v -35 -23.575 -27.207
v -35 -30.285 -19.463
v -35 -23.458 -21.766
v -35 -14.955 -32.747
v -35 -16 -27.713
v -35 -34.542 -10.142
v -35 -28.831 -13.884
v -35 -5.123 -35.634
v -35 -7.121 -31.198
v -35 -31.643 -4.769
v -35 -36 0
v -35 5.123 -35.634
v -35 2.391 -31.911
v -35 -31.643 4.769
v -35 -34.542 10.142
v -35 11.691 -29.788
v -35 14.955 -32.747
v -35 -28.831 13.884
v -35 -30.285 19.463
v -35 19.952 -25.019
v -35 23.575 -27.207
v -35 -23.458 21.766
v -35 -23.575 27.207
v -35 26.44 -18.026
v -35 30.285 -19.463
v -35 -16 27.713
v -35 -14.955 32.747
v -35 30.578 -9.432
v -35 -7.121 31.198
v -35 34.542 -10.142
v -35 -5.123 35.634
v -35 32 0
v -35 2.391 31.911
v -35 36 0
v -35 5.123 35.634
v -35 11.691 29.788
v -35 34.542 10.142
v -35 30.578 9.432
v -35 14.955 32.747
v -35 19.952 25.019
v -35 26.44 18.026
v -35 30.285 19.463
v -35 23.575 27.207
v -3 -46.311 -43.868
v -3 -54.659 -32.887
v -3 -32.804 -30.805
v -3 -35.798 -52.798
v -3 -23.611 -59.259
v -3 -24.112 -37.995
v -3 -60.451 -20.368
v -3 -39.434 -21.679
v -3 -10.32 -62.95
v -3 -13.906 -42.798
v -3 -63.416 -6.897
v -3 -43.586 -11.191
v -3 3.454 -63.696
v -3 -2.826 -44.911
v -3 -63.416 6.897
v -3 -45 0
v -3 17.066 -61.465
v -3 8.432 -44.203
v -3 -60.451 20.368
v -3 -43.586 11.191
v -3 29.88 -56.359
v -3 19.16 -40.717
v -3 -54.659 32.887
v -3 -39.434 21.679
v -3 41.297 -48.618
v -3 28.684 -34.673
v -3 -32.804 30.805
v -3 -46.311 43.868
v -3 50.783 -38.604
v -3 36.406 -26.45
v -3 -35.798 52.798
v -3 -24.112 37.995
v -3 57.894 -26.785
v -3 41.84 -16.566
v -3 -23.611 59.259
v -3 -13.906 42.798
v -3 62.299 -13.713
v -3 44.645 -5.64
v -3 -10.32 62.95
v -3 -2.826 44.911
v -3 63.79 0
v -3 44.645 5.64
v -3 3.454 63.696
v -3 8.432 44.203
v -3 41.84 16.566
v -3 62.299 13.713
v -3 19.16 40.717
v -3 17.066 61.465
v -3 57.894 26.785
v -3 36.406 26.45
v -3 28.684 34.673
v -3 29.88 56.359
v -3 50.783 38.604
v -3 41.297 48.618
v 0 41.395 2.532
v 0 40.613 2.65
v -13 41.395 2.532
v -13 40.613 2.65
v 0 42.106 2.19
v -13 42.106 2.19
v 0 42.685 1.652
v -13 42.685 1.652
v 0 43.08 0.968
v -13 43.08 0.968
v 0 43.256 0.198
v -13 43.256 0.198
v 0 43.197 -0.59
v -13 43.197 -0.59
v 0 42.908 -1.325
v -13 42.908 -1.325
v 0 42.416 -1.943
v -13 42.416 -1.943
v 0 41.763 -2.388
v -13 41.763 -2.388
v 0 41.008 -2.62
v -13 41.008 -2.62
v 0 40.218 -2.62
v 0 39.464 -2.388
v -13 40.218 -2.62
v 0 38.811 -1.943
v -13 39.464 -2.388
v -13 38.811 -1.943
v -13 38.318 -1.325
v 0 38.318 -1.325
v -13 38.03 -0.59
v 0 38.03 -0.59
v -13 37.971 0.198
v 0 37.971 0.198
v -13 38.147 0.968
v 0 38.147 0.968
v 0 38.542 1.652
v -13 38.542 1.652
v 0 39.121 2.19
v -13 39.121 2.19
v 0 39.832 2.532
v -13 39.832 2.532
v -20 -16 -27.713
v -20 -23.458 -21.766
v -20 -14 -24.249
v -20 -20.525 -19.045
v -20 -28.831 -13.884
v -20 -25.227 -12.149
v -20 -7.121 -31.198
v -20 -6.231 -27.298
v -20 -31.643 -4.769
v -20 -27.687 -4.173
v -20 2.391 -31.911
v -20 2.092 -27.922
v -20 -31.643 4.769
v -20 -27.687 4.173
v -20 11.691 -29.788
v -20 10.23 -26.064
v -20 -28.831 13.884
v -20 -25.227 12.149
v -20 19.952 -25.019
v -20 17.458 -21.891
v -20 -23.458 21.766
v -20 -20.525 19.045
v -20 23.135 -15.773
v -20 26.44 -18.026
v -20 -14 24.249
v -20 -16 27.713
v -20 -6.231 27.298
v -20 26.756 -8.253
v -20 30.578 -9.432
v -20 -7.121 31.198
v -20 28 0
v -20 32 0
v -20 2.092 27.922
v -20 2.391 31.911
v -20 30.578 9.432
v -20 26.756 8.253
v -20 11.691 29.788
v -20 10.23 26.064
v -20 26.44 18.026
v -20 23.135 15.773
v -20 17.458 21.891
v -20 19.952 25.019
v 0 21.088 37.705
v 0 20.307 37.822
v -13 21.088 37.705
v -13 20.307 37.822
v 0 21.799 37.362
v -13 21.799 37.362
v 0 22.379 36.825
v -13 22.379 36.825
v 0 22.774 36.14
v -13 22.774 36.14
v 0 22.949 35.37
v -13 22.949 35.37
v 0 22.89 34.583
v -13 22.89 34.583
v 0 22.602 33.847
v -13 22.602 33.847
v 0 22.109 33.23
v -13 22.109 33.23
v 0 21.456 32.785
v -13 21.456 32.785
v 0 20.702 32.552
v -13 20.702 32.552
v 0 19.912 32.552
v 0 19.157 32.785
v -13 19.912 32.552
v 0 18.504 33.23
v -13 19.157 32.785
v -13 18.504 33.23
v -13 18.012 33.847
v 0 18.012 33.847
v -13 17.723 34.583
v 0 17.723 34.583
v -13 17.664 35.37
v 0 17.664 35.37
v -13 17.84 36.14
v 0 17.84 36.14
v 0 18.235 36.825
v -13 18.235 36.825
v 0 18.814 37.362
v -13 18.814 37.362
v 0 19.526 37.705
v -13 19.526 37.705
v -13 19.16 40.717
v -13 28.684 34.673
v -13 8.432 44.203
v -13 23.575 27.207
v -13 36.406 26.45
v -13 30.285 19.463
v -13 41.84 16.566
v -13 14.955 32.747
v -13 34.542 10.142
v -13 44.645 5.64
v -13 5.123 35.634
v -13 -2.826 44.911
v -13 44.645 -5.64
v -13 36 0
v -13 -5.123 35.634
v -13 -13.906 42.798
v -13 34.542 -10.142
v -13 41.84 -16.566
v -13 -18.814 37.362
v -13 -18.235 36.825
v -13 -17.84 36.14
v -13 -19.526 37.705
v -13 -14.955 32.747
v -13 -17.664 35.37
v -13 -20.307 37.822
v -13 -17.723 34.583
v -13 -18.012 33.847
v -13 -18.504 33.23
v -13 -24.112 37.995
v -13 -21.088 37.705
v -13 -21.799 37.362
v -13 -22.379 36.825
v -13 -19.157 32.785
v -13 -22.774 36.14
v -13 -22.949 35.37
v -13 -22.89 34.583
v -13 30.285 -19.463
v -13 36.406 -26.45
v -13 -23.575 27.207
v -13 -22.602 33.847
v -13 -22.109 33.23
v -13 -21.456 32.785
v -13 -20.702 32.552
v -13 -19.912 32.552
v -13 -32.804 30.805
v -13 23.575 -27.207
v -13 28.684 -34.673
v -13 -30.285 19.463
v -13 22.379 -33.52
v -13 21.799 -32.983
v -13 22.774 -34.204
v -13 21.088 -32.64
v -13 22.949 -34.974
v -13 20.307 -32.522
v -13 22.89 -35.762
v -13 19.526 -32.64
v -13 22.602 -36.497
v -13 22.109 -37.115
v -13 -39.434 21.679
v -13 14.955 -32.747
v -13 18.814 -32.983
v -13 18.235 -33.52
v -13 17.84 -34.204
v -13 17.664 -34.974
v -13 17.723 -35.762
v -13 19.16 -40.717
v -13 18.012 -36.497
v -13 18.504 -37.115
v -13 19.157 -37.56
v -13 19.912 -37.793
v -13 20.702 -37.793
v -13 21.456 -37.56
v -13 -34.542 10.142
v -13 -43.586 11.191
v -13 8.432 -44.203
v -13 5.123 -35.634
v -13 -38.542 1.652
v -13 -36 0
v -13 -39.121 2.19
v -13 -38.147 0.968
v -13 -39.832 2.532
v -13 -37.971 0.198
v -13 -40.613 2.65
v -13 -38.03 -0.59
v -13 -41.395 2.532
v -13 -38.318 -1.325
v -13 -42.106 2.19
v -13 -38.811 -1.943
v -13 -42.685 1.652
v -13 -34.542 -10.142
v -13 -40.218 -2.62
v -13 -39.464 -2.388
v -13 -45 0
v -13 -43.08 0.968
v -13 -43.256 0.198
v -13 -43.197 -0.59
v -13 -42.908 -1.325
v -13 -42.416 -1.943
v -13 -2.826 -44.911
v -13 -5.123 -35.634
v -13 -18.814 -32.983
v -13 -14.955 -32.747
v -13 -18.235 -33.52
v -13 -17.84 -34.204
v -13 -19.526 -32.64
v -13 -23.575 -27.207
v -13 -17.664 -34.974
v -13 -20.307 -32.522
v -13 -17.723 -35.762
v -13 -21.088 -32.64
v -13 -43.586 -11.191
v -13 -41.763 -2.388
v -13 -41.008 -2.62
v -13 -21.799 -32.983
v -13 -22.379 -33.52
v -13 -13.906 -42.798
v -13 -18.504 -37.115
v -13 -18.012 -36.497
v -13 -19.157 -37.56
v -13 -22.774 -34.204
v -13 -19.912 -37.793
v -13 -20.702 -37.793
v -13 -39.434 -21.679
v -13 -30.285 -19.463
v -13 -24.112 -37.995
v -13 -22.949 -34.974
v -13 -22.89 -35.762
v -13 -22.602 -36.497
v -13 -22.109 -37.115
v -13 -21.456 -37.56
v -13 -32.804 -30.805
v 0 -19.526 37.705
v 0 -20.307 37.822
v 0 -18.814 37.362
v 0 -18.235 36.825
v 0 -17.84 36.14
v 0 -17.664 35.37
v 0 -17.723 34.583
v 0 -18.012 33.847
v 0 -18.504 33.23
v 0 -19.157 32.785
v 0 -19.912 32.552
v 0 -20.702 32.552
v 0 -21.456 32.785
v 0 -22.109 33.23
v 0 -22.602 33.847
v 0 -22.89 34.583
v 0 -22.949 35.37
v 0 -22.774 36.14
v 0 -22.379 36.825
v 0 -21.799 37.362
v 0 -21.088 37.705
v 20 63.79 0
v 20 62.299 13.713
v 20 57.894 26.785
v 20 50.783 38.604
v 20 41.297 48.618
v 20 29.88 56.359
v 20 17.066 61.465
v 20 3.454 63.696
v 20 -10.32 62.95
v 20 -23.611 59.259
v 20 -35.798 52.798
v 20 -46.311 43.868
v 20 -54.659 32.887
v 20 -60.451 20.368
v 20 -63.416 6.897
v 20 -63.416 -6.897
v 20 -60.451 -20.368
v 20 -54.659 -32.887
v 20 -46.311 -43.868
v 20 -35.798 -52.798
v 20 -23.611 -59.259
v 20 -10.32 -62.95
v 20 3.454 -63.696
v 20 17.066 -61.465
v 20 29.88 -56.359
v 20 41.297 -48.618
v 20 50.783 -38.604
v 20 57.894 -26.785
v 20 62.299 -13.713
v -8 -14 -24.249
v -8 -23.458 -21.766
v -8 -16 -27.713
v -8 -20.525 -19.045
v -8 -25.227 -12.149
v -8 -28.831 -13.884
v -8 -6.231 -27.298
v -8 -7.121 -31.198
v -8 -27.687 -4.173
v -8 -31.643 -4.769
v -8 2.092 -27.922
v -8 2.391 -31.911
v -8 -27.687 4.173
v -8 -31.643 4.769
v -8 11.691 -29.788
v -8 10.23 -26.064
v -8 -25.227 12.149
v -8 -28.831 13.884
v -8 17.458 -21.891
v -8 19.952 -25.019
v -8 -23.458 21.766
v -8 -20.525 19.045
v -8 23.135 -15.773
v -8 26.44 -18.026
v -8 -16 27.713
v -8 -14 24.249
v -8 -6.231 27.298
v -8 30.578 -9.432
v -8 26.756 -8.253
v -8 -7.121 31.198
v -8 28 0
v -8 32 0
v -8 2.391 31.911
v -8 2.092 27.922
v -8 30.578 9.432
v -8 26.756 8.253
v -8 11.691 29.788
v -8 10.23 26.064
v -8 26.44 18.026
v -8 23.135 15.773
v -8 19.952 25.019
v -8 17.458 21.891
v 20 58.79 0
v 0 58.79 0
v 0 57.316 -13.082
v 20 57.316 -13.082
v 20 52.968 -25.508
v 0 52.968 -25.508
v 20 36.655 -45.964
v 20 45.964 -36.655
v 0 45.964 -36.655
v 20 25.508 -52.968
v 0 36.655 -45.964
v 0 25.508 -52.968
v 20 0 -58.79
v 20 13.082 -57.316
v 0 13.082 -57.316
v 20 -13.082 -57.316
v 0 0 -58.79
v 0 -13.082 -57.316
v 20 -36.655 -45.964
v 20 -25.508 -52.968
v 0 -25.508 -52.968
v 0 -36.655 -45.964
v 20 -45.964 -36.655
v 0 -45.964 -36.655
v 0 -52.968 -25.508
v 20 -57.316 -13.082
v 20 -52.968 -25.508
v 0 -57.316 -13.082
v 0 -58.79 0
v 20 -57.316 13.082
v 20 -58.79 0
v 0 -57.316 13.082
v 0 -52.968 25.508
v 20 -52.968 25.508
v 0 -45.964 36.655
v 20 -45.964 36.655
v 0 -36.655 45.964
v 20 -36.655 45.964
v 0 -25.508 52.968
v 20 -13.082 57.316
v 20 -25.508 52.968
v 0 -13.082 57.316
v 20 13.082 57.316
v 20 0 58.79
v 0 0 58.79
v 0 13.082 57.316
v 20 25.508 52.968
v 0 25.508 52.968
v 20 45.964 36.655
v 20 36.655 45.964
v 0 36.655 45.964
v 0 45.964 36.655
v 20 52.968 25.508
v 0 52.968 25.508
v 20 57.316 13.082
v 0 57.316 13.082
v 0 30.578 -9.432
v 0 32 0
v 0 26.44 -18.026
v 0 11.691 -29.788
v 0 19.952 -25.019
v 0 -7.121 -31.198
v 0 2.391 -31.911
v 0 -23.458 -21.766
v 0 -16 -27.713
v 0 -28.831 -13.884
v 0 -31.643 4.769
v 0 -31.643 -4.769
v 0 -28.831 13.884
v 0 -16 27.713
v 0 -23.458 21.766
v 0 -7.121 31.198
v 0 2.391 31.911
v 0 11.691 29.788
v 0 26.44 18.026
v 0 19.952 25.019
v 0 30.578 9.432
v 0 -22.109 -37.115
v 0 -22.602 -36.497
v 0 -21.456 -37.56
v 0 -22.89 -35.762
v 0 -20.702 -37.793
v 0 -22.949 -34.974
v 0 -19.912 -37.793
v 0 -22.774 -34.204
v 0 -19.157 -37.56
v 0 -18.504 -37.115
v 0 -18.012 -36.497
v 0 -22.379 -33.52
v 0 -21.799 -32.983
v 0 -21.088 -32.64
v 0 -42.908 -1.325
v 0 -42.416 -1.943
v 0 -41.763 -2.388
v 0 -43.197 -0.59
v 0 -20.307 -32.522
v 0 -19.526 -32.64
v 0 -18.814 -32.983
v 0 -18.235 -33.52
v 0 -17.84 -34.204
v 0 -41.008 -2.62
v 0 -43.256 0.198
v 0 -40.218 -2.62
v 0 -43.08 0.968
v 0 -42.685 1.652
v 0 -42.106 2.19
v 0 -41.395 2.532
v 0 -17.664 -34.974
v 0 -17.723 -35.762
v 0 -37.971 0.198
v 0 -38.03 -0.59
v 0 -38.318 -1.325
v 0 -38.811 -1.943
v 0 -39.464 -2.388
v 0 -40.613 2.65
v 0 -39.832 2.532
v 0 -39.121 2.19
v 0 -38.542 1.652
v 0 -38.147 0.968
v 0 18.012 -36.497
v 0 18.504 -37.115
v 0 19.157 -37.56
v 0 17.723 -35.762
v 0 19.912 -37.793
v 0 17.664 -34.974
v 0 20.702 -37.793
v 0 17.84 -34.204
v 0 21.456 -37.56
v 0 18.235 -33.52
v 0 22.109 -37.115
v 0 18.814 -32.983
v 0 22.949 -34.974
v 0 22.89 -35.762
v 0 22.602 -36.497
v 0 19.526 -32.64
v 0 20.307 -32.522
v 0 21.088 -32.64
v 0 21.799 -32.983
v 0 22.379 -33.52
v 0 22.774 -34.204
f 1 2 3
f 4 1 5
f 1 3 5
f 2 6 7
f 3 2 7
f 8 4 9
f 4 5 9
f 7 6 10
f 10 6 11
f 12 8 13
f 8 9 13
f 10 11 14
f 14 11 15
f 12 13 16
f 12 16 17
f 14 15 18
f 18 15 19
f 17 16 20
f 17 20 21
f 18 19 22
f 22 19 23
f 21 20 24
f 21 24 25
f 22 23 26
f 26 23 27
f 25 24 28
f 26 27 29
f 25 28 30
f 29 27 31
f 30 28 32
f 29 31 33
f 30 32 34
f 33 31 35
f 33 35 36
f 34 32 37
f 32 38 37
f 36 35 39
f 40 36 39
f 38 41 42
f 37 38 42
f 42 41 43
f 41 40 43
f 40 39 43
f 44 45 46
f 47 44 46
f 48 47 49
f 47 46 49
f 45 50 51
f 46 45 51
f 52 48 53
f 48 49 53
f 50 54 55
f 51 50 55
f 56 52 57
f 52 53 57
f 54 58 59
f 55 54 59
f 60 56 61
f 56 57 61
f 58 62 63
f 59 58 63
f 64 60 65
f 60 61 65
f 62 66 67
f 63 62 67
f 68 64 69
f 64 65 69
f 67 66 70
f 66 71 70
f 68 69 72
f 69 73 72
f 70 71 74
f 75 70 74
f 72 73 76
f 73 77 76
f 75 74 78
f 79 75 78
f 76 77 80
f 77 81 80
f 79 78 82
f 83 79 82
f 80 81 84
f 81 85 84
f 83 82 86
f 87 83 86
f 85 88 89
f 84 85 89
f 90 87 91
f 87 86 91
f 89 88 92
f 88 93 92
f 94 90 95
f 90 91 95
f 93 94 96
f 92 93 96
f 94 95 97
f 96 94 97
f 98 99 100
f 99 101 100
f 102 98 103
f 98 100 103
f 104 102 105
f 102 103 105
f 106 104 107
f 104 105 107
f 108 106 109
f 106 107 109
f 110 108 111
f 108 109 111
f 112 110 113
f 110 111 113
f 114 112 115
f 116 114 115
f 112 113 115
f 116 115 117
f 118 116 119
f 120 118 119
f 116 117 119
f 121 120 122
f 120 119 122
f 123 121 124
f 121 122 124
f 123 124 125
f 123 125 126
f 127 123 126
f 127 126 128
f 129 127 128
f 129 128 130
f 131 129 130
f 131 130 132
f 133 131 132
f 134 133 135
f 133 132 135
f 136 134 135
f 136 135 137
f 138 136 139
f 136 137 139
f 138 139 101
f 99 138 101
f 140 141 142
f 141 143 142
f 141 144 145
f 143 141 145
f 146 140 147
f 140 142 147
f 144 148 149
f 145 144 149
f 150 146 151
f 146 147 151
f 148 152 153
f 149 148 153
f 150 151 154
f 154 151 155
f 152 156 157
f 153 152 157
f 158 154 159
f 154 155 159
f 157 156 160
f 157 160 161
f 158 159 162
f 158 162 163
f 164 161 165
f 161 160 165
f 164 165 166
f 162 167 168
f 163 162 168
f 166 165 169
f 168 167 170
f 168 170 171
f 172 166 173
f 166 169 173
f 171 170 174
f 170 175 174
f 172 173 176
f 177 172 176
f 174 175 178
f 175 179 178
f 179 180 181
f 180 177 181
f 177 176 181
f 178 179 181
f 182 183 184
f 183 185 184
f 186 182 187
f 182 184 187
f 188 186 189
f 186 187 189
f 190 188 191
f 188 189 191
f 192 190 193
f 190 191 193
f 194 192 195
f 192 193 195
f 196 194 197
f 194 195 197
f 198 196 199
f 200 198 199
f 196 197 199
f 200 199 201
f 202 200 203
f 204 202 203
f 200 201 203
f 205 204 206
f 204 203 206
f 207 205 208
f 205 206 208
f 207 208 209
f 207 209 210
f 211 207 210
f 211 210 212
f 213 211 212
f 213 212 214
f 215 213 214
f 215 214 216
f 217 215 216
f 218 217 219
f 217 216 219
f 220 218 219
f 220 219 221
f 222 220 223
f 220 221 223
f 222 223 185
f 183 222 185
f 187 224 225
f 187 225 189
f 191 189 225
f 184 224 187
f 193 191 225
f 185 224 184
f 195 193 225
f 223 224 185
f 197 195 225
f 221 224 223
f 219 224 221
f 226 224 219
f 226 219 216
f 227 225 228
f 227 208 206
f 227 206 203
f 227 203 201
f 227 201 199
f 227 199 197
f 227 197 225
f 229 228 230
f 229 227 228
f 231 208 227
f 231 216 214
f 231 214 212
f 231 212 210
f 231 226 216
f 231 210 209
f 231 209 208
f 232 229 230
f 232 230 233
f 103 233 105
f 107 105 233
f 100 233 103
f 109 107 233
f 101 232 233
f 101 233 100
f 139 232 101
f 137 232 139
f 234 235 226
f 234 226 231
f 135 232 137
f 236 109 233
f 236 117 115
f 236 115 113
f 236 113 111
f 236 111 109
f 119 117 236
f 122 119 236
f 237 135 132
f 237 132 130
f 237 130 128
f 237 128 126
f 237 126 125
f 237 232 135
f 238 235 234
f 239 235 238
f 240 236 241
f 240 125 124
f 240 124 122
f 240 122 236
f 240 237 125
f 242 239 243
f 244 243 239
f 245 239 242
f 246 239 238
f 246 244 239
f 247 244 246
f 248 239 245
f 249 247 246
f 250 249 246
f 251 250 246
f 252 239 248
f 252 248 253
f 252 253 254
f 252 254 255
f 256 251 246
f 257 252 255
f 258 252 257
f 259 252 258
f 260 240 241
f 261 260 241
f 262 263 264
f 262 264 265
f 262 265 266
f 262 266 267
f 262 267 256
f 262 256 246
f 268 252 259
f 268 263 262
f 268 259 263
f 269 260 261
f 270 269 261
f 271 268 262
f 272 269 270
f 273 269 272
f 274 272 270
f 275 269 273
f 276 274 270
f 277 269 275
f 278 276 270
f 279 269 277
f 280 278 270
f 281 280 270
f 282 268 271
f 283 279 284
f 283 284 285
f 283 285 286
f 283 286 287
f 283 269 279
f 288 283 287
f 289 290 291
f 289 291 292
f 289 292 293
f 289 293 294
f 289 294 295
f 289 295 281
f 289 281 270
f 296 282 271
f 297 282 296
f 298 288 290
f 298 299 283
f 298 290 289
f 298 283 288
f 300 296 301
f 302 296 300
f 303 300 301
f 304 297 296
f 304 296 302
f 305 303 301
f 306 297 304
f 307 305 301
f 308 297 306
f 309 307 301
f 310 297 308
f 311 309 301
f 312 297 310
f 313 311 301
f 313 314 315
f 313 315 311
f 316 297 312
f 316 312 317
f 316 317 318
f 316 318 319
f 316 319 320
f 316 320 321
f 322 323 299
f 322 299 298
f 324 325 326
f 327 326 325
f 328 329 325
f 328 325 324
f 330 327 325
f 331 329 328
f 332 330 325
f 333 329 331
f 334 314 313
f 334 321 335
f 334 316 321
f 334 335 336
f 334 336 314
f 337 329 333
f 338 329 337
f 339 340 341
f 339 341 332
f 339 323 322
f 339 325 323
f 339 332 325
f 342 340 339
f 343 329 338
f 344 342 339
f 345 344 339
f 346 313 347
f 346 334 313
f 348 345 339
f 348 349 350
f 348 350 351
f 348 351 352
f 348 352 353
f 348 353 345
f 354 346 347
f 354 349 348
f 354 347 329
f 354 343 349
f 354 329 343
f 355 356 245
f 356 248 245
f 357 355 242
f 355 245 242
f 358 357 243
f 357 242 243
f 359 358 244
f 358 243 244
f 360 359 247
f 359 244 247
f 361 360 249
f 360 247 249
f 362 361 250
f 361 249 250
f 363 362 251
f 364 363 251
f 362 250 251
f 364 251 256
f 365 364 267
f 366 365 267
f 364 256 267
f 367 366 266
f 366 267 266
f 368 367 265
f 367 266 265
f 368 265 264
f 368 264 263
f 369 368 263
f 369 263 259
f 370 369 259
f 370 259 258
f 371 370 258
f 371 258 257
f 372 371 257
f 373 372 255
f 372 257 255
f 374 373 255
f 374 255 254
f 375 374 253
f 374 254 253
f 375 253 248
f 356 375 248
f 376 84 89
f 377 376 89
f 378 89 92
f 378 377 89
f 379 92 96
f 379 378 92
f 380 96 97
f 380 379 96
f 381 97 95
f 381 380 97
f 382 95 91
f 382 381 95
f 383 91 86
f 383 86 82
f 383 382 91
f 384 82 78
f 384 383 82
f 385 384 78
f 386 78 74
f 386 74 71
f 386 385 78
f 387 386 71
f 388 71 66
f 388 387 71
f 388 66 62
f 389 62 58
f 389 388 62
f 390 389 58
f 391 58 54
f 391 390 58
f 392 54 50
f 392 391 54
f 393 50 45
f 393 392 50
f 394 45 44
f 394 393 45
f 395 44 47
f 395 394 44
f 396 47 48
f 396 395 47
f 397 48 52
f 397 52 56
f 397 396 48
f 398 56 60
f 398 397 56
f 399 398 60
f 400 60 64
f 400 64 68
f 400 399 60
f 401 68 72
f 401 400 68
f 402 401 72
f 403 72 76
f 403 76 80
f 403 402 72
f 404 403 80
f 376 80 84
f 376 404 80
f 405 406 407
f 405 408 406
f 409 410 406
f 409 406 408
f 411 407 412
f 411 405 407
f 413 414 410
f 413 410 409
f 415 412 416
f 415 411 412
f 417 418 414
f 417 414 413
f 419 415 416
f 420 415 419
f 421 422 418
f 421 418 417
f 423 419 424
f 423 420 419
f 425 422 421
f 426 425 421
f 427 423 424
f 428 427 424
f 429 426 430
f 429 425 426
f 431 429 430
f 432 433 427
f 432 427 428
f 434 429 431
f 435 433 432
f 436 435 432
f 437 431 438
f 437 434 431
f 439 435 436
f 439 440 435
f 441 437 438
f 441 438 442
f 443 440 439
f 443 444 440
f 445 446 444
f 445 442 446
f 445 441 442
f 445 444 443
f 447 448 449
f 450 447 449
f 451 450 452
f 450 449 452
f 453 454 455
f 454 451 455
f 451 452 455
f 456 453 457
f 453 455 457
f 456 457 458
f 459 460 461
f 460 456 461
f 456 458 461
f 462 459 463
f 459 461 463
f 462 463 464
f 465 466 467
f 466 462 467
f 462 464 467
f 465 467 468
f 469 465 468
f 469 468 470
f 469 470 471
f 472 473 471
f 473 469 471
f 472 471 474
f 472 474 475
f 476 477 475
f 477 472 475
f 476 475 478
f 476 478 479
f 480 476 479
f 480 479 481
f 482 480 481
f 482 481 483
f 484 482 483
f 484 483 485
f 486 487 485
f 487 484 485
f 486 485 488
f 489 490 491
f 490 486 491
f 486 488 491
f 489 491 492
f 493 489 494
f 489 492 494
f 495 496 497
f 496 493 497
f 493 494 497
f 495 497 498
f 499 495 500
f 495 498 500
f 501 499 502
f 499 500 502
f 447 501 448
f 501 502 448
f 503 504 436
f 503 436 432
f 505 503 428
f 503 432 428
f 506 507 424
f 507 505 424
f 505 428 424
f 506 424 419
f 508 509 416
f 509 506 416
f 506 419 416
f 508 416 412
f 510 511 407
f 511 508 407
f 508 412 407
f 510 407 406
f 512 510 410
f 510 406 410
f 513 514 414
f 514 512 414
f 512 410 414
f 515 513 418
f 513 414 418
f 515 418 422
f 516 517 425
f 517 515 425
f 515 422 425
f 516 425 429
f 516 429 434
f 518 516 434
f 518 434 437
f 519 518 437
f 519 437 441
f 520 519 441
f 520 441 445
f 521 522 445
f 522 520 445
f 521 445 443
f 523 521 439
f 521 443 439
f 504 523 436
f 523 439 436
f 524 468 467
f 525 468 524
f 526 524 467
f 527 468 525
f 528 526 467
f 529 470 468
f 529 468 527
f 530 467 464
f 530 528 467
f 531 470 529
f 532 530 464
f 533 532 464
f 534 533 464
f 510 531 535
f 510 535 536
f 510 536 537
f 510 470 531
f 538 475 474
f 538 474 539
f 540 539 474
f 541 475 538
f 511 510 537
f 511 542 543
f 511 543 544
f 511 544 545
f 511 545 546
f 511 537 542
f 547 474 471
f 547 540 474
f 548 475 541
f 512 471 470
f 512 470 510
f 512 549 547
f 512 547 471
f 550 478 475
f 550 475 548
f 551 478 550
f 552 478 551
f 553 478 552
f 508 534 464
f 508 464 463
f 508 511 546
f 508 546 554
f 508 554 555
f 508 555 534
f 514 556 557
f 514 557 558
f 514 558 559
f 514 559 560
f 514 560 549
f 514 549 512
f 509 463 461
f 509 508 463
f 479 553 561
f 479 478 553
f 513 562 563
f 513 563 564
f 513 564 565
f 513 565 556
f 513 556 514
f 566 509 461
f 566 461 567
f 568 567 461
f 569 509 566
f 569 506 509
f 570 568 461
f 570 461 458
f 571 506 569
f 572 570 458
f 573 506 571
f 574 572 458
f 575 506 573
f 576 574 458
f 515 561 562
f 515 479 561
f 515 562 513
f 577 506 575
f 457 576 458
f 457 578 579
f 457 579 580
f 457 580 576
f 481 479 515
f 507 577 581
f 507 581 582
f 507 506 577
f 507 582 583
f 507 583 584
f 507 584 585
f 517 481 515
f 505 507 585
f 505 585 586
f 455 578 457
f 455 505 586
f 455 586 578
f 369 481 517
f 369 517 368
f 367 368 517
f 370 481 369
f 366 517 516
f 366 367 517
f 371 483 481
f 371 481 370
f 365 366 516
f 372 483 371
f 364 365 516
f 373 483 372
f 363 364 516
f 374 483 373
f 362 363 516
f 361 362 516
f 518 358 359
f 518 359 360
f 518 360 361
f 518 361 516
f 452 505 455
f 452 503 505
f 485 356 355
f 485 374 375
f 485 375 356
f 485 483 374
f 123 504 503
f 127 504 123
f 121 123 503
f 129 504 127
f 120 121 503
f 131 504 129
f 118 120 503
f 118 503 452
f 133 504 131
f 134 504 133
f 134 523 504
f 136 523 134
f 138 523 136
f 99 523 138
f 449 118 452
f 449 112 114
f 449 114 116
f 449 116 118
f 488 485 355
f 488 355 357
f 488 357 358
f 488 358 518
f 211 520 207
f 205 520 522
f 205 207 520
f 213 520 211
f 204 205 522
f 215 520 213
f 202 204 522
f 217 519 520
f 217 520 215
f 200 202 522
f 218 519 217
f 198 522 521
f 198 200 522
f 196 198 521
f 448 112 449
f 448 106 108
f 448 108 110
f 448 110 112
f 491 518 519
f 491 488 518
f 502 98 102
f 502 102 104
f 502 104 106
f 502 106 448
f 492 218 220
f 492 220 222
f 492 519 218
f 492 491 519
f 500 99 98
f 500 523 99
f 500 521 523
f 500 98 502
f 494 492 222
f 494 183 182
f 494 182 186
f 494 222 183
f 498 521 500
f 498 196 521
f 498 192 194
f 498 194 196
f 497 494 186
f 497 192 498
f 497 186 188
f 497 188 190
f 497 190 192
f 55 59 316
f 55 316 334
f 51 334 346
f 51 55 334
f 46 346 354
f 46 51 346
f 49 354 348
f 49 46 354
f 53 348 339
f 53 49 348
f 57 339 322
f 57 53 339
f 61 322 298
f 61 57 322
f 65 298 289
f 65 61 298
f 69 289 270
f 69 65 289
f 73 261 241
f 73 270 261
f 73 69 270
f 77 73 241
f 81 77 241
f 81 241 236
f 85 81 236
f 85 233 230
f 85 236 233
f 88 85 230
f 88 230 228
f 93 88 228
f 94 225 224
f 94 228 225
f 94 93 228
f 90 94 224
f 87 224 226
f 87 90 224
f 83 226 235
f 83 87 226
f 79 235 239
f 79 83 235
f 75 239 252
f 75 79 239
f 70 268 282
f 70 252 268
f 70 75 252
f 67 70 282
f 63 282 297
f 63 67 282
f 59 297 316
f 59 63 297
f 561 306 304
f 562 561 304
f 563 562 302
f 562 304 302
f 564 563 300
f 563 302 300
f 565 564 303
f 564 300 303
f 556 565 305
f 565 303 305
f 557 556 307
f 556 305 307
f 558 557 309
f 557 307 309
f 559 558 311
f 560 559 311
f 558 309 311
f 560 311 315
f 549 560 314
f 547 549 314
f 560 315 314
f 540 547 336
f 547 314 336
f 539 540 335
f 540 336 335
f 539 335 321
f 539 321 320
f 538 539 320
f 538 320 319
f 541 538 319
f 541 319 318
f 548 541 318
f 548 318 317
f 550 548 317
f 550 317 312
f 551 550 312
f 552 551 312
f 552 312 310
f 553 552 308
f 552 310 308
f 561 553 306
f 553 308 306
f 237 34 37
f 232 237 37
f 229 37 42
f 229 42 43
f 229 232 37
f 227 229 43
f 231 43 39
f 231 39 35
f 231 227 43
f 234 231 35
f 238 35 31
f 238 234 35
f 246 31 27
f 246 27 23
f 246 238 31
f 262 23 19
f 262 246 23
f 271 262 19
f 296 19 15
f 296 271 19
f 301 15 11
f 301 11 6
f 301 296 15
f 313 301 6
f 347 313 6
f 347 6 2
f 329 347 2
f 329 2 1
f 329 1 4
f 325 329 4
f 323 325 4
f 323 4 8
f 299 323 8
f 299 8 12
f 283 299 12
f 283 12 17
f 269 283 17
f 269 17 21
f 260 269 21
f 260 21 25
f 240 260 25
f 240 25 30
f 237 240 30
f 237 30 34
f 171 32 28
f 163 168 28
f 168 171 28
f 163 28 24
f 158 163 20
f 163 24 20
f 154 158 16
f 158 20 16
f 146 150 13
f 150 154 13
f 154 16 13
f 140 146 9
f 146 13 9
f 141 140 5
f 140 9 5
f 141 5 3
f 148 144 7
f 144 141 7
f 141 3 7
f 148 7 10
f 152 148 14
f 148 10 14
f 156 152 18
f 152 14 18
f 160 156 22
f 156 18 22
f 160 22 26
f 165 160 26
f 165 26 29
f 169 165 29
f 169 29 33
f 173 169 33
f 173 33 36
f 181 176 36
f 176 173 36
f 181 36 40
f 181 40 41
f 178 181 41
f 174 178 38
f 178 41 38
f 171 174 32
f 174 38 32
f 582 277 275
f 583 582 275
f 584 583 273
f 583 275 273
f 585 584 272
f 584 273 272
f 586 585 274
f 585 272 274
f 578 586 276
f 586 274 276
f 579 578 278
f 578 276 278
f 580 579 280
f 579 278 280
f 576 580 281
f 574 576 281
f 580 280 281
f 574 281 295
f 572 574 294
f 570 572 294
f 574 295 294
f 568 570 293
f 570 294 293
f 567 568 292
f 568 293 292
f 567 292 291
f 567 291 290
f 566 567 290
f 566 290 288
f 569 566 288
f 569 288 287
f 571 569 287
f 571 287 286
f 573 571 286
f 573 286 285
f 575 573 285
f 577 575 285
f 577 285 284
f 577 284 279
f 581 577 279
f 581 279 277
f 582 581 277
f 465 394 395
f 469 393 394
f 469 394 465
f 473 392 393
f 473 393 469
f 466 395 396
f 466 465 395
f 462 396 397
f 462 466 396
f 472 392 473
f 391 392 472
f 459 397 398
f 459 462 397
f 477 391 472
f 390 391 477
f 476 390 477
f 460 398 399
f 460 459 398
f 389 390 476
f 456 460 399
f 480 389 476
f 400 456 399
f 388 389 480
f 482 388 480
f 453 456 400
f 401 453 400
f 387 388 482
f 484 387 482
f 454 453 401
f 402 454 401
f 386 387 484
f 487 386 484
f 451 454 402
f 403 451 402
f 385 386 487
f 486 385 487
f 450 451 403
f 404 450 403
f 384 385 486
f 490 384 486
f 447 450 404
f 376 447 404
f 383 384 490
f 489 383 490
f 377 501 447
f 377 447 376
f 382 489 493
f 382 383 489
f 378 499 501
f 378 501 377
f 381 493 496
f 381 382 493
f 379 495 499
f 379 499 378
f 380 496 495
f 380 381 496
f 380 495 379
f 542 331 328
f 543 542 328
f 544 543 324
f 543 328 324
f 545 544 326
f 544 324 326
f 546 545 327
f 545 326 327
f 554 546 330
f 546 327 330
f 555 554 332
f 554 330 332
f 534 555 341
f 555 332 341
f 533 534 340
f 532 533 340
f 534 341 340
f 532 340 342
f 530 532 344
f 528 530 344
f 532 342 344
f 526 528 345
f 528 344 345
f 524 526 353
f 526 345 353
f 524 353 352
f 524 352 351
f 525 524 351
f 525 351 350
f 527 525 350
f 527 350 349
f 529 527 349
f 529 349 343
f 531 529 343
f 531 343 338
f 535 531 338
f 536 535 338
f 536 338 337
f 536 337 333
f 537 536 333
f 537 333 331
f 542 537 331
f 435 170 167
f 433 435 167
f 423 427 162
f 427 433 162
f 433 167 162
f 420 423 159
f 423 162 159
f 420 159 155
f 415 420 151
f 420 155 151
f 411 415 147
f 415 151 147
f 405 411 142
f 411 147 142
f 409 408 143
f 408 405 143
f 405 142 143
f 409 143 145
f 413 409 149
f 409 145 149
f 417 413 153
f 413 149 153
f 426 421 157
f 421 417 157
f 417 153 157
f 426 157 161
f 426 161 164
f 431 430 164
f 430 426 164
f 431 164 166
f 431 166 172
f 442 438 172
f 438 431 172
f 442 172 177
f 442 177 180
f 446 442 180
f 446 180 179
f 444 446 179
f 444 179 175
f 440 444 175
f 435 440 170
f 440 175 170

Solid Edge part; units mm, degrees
sketch "Sketch1" plane through (0, 0, 0) normal (0, 0, 1) x (1, 0, 0)
  line L0 (20, 58.79) -> (0, 58.79)
  line L1 (0, 58.79) -> (0, 32)
  line L2 (0, 32) -> (-8, 32)
  line L3 (-8, 32) -> (-8, 28)
  line L4 (-8, 28) -> (-20, 28)
  line L5 (-20, 28) -> (-20, 32)
  line L6 (-20, 32) -> (-35, 32)
  line L7 (-35, 32) -> (-35, 36)
  line L8 (-35, 36) -> (-3, 36)
  line L9 (-3, 36) -> (-3, 63.79)
  line L10 (-3, 63.79) -> (20, 63.79)
  line L11 (20, 63.79) -> (20, 58.79)
  dimension "D1" = 23
  dimension "D2" = 20
  dimension "D3" = 26.79
  dimension "D4" = 8
  dimension "D5" = 12
  dimension "D6" = 15
  dimension "D7" = 32
  dimension "D8" = 4
  dimension "D9" = 27.79
  dimension "D10" = 5
  dimension "D11" = 58.79
  dimension "D12" = 32
  dimension "D13" = 4
revolve "RevolvedProtrusion1" add sketch "Sketch1" angle 360 about axis through (0, 0, 0) along (1, 0, 0)
sketch "Sketch2" plane through (-3, 0, 0) normal (-1, 0, 0) x (0, -1, 0)
  circle A0 centre (0, 0) radius 45
  circle A1 centre (0, 0) radius 36
  dimension "D1" = 90
extrude "ExtrudedProtrusion_1" add sketch "Sketch2" along normal blind 10
hole "Hole_2" at (-13, 40.6134, 0) direction (1, 0, 0) diameter 5.3 end up to next
hole "Hole1" at (-13, 20.3067, 35.1723) direction (1, 0, 0) diameter 5.3 end up to next
hole "Hole2" at (-13, -20.3067, 35.1723) direction (1, 0, 0) diameter 5.3 end up to next
hole "Hole3" at (-13, -40.6134, 0) direction (1, 0, 0) diameter 5.3 end up to next
hole "Hole4" at (-13, -20.3067, -35.1723) direction (1, 0, 0) diameter 5.3 end up to next
hole "Hole5" at (-13, 20.3067, -35.1723) direction (1, 0, 0) diameter 5.3 end up to next
properties material "Aluminum, 6061-T6"
